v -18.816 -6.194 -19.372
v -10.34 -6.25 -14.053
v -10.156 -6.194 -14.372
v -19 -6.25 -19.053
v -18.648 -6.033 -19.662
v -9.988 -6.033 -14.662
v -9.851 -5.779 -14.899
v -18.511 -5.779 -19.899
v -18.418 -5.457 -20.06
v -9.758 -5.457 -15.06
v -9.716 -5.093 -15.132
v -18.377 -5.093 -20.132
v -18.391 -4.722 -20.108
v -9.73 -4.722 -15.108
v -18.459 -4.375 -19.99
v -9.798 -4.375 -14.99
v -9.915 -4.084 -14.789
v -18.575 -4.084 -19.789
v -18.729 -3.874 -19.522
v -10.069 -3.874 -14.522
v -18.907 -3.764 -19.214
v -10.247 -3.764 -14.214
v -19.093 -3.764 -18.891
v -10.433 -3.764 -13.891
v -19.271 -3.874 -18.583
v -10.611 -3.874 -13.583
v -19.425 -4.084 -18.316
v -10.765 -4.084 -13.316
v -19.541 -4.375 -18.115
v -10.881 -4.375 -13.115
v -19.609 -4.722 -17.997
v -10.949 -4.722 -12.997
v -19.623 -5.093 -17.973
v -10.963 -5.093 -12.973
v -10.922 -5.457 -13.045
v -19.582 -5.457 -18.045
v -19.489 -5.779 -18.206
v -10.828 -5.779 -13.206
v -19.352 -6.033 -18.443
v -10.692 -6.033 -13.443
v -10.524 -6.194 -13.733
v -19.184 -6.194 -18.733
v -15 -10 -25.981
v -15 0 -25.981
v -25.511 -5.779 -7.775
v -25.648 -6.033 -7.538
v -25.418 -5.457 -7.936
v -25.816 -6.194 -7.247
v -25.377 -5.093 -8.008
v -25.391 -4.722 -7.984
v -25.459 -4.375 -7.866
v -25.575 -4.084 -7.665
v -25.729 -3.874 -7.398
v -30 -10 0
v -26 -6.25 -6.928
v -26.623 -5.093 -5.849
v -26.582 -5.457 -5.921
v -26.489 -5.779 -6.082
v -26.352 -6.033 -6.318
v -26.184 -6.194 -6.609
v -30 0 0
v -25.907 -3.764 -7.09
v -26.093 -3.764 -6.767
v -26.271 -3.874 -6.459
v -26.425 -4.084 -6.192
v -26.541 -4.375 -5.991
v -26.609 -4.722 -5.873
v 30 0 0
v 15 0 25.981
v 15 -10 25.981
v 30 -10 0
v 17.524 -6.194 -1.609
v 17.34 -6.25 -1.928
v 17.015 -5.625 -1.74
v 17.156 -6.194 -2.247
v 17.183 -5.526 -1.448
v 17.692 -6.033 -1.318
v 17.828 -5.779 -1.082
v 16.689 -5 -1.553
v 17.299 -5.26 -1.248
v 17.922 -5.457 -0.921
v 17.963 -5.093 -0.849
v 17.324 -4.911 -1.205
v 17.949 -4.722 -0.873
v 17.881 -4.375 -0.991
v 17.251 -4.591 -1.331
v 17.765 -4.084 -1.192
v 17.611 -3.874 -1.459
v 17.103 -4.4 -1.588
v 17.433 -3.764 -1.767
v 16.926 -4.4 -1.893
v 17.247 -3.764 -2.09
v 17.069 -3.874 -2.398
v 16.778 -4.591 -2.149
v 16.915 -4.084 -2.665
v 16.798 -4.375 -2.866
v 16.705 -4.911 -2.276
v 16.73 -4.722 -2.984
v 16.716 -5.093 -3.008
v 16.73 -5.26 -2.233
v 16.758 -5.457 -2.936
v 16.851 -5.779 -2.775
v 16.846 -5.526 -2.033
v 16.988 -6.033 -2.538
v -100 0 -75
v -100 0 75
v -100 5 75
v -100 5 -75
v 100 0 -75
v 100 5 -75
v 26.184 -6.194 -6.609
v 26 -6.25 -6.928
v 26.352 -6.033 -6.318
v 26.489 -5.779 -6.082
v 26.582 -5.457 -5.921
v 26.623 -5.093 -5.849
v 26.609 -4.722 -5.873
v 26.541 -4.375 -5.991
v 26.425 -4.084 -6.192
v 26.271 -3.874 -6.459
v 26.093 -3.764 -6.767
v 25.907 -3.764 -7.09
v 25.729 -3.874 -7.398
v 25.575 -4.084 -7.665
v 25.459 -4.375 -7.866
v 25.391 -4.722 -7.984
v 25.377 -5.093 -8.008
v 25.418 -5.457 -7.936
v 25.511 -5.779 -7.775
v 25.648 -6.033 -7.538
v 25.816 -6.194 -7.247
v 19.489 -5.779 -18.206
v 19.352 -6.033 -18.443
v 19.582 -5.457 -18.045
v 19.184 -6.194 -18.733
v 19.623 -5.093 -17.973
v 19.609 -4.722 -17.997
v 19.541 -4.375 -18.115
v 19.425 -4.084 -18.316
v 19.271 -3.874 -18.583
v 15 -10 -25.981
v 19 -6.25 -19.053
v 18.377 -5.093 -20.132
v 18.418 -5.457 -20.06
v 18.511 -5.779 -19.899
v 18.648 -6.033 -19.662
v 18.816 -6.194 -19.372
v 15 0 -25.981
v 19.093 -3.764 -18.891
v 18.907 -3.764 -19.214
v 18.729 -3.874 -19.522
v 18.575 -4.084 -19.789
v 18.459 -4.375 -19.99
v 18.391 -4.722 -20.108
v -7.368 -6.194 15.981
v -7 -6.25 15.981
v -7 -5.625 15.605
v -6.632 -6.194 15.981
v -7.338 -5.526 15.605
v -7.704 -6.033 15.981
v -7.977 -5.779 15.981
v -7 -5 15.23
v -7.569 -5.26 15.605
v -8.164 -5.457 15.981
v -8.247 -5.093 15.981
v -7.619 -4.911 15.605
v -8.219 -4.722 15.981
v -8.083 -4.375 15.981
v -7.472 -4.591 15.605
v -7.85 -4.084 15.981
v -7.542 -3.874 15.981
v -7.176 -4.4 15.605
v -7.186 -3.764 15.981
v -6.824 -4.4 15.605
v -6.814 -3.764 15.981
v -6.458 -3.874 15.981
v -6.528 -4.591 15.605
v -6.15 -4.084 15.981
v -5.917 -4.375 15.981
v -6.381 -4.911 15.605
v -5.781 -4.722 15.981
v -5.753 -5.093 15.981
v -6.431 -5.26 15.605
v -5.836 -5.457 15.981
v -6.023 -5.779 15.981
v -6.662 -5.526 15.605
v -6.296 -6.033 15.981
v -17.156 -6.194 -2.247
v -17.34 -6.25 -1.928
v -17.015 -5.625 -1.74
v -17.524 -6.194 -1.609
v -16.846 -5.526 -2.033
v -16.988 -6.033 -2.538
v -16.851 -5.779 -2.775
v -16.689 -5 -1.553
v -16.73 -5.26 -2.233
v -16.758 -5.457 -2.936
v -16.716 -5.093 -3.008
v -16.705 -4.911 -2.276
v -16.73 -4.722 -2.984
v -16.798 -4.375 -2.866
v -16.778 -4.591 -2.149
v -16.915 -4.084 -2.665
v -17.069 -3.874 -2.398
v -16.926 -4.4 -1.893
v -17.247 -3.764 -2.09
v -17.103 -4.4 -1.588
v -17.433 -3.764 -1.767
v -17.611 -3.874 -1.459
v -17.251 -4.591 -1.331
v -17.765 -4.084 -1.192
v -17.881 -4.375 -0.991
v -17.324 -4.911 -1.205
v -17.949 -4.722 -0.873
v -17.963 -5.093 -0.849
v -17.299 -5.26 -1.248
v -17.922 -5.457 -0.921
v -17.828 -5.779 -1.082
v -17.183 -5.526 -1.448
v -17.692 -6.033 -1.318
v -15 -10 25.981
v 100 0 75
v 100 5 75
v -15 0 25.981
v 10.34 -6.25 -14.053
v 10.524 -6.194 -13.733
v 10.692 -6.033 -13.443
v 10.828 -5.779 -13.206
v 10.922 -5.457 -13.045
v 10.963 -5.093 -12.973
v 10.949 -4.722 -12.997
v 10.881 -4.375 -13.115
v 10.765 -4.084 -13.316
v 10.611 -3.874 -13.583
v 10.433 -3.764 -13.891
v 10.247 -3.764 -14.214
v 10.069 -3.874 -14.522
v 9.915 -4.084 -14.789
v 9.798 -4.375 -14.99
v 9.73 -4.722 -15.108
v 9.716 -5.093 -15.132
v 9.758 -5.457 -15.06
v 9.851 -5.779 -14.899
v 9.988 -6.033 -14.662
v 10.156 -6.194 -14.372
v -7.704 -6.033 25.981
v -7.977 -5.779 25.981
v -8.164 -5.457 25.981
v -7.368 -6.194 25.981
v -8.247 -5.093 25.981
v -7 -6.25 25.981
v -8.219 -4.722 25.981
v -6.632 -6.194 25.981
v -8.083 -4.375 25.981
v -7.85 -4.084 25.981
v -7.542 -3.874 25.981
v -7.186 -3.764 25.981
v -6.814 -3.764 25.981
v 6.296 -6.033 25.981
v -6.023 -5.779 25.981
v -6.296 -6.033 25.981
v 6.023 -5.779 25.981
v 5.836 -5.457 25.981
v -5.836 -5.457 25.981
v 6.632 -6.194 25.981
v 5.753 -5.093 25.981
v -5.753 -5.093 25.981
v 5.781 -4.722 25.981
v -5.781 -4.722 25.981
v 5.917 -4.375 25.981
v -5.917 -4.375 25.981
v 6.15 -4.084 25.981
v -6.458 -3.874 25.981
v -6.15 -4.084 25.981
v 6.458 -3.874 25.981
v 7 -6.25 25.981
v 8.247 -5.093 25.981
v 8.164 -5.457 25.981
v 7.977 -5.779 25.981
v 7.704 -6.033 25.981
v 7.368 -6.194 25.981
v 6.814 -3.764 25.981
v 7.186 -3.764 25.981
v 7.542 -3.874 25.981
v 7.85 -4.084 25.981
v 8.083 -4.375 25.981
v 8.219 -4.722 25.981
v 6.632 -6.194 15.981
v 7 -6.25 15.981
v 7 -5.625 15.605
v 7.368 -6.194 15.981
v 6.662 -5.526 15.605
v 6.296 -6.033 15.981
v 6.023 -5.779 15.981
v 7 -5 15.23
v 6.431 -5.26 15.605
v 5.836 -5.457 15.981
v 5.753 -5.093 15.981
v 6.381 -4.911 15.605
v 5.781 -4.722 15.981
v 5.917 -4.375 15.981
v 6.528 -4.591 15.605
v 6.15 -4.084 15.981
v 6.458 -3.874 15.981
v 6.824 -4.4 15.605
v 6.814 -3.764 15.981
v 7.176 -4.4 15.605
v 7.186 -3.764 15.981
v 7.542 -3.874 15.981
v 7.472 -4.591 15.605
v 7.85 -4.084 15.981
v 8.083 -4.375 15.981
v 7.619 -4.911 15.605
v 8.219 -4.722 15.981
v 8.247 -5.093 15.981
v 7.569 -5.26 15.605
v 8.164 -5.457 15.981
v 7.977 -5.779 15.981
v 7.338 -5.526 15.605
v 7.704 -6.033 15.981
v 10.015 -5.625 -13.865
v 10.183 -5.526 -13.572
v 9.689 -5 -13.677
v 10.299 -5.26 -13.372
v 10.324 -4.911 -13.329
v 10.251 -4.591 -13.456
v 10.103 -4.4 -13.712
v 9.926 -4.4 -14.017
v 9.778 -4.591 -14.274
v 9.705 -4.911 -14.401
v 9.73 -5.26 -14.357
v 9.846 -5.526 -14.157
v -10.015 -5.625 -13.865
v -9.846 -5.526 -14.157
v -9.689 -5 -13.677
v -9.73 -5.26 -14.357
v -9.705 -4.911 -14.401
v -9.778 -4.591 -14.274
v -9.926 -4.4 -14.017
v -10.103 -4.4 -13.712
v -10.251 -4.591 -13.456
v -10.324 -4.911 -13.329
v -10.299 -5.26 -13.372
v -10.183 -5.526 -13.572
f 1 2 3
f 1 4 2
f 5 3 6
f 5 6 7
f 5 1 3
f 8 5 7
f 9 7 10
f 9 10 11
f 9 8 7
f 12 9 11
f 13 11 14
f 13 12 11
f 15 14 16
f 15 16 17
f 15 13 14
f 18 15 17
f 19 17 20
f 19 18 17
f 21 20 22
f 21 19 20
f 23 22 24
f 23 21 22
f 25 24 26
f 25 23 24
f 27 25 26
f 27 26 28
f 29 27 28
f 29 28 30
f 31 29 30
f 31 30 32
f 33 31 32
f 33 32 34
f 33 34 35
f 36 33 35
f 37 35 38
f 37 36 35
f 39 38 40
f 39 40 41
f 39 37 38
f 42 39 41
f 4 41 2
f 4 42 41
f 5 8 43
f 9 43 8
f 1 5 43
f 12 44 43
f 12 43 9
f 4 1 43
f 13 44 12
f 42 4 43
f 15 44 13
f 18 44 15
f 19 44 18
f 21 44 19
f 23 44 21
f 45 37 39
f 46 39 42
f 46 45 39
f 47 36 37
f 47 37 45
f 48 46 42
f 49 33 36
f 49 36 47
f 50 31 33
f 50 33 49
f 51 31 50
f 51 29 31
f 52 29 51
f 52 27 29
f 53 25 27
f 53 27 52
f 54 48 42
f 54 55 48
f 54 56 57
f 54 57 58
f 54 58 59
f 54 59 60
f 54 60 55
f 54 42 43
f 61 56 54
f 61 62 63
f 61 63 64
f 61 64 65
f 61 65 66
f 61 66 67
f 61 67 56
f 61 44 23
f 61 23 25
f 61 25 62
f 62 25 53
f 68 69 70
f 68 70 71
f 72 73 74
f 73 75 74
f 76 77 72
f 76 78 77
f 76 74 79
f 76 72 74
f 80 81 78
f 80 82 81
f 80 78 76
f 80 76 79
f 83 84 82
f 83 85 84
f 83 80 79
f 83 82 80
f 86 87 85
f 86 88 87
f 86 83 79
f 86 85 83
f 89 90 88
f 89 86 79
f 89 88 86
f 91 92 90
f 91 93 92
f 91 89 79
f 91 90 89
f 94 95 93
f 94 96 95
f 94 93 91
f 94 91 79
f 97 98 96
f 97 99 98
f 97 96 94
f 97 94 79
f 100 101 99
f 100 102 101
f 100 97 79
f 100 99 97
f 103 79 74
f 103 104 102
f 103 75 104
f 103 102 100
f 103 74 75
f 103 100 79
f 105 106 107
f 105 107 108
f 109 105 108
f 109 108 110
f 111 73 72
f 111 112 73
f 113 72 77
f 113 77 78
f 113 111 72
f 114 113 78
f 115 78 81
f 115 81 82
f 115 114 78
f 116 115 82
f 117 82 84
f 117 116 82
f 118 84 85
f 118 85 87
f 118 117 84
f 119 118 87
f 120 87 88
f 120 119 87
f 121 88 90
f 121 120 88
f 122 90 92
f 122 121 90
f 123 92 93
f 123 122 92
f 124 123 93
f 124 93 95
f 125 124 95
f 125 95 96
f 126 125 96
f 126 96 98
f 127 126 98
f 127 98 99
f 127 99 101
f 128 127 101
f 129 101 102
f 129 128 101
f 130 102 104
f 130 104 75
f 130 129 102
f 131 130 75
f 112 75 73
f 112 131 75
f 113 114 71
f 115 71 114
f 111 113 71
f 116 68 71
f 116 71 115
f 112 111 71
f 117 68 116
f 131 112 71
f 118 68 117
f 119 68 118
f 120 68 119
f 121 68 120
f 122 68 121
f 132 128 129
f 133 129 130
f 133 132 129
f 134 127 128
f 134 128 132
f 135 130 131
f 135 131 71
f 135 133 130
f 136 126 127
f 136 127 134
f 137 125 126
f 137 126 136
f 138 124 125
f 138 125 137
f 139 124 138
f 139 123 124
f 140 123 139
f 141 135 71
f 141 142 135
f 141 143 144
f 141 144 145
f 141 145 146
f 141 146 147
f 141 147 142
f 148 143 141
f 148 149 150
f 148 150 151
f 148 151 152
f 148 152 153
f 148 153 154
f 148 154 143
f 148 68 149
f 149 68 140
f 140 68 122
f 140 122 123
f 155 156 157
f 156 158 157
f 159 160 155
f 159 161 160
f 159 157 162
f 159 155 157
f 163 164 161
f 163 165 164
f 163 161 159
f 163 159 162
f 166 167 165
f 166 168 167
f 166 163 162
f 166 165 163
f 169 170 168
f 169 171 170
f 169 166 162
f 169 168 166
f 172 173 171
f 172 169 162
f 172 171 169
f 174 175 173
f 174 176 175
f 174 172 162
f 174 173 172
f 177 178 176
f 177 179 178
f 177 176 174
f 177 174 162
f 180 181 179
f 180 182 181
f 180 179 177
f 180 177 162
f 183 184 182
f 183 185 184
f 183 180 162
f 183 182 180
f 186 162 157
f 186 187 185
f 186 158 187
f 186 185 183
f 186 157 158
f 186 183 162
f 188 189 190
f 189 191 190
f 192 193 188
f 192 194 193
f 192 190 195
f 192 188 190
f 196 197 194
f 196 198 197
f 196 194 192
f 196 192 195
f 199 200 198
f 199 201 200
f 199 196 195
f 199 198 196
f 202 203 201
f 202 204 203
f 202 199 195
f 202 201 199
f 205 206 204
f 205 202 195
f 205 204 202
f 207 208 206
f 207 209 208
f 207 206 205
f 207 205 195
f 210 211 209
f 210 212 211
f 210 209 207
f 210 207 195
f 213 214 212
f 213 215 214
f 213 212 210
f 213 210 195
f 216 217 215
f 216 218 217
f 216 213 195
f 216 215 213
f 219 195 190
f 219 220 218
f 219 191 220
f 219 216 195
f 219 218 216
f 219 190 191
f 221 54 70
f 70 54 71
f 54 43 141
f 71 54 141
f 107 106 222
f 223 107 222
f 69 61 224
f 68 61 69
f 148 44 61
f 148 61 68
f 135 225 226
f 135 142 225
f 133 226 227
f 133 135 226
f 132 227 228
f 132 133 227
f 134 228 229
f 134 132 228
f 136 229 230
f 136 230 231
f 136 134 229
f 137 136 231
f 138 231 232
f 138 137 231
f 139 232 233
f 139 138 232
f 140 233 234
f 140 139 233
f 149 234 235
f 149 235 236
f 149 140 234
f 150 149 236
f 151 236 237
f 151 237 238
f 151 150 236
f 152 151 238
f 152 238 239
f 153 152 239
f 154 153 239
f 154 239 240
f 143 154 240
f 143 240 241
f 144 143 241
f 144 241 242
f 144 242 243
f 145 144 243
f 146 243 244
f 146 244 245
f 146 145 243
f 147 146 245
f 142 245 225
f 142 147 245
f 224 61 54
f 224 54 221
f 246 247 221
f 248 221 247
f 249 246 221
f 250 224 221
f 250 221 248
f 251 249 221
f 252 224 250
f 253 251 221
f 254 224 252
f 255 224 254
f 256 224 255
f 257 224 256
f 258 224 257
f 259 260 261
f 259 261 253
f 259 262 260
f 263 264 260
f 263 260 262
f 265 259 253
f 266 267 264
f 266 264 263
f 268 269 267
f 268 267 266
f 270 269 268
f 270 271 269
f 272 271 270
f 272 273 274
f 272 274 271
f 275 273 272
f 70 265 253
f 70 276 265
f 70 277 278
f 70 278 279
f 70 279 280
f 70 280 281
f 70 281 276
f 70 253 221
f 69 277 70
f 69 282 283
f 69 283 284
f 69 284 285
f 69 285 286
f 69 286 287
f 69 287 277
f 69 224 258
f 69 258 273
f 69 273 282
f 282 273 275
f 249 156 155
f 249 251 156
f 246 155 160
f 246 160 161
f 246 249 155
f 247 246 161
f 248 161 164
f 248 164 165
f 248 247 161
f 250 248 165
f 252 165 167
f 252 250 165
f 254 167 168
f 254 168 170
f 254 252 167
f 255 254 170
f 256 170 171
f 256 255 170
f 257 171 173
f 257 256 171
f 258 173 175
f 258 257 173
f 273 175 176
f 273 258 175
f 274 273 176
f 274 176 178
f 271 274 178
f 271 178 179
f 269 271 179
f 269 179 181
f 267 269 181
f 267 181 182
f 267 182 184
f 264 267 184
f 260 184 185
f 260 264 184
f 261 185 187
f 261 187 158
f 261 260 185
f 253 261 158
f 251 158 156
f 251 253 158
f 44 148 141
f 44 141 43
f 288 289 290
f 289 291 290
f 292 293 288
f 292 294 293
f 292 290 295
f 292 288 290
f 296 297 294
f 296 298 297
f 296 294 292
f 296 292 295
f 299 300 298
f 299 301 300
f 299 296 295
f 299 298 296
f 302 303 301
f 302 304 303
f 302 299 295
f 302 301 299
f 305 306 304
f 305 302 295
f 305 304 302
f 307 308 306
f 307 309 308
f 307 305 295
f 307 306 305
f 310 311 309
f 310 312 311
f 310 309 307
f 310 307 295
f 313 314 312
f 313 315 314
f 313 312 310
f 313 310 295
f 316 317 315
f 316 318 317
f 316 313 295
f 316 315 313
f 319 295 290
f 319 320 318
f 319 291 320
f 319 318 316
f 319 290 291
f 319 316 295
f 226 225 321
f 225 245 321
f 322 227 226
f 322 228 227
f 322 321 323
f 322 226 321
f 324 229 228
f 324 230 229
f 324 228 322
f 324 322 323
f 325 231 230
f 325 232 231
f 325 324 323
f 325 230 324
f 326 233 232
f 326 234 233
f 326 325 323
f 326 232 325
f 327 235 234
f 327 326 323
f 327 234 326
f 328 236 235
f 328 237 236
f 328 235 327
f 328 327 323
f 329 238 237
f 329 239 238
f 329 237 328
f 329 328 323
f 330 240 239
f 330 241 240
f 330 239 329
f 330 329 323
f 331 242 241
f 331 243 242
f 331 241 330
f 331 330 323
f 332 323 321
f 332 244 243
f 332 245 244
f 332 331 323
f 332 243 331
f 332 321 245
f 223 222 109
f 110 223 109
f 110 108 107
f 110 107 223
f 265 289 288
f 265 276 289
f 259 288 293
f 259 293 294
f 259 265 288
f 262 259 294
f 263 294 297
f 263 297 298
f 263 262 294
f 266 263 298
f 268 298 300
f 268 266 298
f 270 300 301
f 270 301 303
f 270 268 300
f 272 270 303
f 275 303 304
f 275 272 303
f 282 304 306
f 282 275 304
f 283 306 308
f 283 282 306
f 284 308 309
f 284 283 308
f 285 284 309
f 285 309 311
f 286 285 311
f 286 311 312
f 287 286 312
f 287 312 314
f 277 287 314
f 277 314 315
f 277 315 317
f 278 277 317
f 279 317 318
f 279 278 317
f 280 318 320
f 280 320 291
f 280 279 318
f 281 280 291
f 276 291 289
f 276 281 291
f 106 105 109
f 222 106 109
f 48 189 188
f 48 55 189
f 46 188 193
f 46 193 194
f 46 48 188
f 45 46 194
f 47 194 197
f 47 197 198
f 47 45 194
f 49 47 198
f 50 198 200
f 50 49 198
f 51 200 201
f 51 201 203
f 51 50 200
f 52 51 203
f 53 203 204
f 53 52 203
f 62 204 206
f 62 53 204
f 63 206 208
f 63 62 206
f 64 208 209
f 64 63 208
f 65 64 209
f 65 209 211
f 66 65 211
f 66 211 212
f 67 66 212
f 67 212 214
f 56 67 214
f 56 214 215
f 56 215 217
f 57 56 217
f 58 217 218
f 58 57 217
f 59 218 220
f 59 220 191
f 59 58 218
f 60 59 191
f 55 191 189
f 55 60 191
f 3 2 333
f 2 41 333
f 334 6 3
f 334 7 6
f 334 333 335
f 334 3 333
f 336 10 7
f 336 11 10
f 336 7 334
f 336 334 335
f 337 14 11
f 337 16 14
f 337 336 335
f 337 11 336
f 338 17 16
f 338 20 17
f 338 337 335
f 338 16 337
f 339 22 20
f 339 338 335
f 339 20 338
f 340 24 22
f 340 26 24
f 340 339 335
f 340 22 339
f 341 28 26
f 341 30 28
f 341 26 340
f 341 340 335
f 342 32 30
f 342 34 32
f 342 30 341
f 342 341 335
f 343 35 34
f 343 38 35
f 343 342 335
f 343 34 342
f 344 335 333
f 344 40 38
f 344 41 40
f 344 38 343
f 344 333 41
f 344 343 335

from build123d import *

# Parameters (mm, degrees)
SKETCH1_W                      = 200
SKETCH1_H                      = 150
BOSS_EXTRUDE1_DEPTH            = 5
BOSS_EXTRUDE2_DEPTH            = 10
M3X0_5_TAPPED_HOLE1_AT_2_COUNT = 2
M3X0_5_TAPPED_HOLE1_AT_2_PITCH = 14
CIRPATTERN1_COUNT              = 3


with BuildPart() as part:
    # Sketch1 → Boss-Extrude1 (new body)
    with BuildSketch(Plane(origin=(0, 0, 0), x_dir=(1, 0, 0), z_dir=(0, 1, 0))):
        Rectangle(SKETCH1_W, SKETCH1_H)
    extrude(amount=BOSS_EXTRUDE1_DEPTH)


with BuildPart() as body_2:
    # Sketch2 → Boss-Extrude2 (new body)
    with BuildSketch(Plane(origin=(0, 0, 0), x_dir=(1, 0, 0), z_dir=(0, 1, 0))):
        Polygon((-30, 0), (-15, -25.980762114), (15, -25.980762114), (30, 0), (15, 25.980762114), (-15, 25.980762114), align=None)
    extrude(amount=-BOSS_EXTRUDE2_DEPTH)

    # Sketch4 → M3x0.5 Tapped Hole1 (revolve, cut)
    with BuildSketch(Plane(origin=(-7, -5, 25.980762114), x_dir=(0, -1, 0), z_dir=(1, 0, 0))):
        Polygon((0, 0), (0, 10.751075774), (1.25, 10), (1.25, 0), align=None)
    m3x0_5_tapped_hole1 = revolve(axis=Axis((-7, -5, 32.330762114), (0, 0, -1)), mode=Mode.SUBTRACT)

    # M3x0.5 Tapped Hole1 at 2: M3x0.5 Tapped Hole1 ×2
    with Locations(*[(i * M3X0_5_TAPPED_HOLE1_AT_2_PITCH, 0, 0) for i in range(1, M3X0_5_TAPPED_HOLE1_AT_2_COUNT)]):
        add(m3x0_5_tapped_hole1, mode=Mode.SUBTRACT)

    # CirPattern1: M3x0.5 Tapped Hole1 ×3 about axis
    cirpattern1_axis = Axis((0, 0, 0), (0, 1, 0))
    for i in range(1, CIRPATTERN1_COUNT):
        add(m3x0_5_tapped_hole1.rotate(cirpattern1_axis, i * 360 / CIRPATTERN1_COUNT), mode=Mode.SUBTRACT)

    # CirPattern1 copy 1 sketch → CirPattern1 copy 1 (revolve, cut)
    with BuildSketch(Plane(origin=(19, -5, -19.052558883), x_dir=(0, -1, 0), z_dir=(-0.4999999999999998, 0, -0.8660254037844387))):
        Polygon((0, 0), (0, 10.751075774), (1.25, 10), (1.25, 0), align=None)
    revolve(axis=Axis((24.499261314, -5, -22.227558883), (-0.8660254037844387, 0, 0.4999999999999998)), mode=Mode.SUBTRACT)

    # CirPattern1 copy 2 sketch → CirPattern1 copy 2 (revolve, cut)
    with BuildSketch(Plane(origin=(-26, -5, -6.92820323), x_dir=(0, -1, 0), z_dir=(-0.5000000000000004, 0, 0.8660254037844384))):
        Polygon((0, 0), (0, 10.751075774), (1.25, 10), (1.25, 0), align=None)
    revolve(axis=Axis((-31.499261314, -5, -10.10320323), (0.8660254037844384, 0, 0.5000000000000004)), mode=Mode.SUBTRACT)


solid = Compound([part.part, body_2.part])
